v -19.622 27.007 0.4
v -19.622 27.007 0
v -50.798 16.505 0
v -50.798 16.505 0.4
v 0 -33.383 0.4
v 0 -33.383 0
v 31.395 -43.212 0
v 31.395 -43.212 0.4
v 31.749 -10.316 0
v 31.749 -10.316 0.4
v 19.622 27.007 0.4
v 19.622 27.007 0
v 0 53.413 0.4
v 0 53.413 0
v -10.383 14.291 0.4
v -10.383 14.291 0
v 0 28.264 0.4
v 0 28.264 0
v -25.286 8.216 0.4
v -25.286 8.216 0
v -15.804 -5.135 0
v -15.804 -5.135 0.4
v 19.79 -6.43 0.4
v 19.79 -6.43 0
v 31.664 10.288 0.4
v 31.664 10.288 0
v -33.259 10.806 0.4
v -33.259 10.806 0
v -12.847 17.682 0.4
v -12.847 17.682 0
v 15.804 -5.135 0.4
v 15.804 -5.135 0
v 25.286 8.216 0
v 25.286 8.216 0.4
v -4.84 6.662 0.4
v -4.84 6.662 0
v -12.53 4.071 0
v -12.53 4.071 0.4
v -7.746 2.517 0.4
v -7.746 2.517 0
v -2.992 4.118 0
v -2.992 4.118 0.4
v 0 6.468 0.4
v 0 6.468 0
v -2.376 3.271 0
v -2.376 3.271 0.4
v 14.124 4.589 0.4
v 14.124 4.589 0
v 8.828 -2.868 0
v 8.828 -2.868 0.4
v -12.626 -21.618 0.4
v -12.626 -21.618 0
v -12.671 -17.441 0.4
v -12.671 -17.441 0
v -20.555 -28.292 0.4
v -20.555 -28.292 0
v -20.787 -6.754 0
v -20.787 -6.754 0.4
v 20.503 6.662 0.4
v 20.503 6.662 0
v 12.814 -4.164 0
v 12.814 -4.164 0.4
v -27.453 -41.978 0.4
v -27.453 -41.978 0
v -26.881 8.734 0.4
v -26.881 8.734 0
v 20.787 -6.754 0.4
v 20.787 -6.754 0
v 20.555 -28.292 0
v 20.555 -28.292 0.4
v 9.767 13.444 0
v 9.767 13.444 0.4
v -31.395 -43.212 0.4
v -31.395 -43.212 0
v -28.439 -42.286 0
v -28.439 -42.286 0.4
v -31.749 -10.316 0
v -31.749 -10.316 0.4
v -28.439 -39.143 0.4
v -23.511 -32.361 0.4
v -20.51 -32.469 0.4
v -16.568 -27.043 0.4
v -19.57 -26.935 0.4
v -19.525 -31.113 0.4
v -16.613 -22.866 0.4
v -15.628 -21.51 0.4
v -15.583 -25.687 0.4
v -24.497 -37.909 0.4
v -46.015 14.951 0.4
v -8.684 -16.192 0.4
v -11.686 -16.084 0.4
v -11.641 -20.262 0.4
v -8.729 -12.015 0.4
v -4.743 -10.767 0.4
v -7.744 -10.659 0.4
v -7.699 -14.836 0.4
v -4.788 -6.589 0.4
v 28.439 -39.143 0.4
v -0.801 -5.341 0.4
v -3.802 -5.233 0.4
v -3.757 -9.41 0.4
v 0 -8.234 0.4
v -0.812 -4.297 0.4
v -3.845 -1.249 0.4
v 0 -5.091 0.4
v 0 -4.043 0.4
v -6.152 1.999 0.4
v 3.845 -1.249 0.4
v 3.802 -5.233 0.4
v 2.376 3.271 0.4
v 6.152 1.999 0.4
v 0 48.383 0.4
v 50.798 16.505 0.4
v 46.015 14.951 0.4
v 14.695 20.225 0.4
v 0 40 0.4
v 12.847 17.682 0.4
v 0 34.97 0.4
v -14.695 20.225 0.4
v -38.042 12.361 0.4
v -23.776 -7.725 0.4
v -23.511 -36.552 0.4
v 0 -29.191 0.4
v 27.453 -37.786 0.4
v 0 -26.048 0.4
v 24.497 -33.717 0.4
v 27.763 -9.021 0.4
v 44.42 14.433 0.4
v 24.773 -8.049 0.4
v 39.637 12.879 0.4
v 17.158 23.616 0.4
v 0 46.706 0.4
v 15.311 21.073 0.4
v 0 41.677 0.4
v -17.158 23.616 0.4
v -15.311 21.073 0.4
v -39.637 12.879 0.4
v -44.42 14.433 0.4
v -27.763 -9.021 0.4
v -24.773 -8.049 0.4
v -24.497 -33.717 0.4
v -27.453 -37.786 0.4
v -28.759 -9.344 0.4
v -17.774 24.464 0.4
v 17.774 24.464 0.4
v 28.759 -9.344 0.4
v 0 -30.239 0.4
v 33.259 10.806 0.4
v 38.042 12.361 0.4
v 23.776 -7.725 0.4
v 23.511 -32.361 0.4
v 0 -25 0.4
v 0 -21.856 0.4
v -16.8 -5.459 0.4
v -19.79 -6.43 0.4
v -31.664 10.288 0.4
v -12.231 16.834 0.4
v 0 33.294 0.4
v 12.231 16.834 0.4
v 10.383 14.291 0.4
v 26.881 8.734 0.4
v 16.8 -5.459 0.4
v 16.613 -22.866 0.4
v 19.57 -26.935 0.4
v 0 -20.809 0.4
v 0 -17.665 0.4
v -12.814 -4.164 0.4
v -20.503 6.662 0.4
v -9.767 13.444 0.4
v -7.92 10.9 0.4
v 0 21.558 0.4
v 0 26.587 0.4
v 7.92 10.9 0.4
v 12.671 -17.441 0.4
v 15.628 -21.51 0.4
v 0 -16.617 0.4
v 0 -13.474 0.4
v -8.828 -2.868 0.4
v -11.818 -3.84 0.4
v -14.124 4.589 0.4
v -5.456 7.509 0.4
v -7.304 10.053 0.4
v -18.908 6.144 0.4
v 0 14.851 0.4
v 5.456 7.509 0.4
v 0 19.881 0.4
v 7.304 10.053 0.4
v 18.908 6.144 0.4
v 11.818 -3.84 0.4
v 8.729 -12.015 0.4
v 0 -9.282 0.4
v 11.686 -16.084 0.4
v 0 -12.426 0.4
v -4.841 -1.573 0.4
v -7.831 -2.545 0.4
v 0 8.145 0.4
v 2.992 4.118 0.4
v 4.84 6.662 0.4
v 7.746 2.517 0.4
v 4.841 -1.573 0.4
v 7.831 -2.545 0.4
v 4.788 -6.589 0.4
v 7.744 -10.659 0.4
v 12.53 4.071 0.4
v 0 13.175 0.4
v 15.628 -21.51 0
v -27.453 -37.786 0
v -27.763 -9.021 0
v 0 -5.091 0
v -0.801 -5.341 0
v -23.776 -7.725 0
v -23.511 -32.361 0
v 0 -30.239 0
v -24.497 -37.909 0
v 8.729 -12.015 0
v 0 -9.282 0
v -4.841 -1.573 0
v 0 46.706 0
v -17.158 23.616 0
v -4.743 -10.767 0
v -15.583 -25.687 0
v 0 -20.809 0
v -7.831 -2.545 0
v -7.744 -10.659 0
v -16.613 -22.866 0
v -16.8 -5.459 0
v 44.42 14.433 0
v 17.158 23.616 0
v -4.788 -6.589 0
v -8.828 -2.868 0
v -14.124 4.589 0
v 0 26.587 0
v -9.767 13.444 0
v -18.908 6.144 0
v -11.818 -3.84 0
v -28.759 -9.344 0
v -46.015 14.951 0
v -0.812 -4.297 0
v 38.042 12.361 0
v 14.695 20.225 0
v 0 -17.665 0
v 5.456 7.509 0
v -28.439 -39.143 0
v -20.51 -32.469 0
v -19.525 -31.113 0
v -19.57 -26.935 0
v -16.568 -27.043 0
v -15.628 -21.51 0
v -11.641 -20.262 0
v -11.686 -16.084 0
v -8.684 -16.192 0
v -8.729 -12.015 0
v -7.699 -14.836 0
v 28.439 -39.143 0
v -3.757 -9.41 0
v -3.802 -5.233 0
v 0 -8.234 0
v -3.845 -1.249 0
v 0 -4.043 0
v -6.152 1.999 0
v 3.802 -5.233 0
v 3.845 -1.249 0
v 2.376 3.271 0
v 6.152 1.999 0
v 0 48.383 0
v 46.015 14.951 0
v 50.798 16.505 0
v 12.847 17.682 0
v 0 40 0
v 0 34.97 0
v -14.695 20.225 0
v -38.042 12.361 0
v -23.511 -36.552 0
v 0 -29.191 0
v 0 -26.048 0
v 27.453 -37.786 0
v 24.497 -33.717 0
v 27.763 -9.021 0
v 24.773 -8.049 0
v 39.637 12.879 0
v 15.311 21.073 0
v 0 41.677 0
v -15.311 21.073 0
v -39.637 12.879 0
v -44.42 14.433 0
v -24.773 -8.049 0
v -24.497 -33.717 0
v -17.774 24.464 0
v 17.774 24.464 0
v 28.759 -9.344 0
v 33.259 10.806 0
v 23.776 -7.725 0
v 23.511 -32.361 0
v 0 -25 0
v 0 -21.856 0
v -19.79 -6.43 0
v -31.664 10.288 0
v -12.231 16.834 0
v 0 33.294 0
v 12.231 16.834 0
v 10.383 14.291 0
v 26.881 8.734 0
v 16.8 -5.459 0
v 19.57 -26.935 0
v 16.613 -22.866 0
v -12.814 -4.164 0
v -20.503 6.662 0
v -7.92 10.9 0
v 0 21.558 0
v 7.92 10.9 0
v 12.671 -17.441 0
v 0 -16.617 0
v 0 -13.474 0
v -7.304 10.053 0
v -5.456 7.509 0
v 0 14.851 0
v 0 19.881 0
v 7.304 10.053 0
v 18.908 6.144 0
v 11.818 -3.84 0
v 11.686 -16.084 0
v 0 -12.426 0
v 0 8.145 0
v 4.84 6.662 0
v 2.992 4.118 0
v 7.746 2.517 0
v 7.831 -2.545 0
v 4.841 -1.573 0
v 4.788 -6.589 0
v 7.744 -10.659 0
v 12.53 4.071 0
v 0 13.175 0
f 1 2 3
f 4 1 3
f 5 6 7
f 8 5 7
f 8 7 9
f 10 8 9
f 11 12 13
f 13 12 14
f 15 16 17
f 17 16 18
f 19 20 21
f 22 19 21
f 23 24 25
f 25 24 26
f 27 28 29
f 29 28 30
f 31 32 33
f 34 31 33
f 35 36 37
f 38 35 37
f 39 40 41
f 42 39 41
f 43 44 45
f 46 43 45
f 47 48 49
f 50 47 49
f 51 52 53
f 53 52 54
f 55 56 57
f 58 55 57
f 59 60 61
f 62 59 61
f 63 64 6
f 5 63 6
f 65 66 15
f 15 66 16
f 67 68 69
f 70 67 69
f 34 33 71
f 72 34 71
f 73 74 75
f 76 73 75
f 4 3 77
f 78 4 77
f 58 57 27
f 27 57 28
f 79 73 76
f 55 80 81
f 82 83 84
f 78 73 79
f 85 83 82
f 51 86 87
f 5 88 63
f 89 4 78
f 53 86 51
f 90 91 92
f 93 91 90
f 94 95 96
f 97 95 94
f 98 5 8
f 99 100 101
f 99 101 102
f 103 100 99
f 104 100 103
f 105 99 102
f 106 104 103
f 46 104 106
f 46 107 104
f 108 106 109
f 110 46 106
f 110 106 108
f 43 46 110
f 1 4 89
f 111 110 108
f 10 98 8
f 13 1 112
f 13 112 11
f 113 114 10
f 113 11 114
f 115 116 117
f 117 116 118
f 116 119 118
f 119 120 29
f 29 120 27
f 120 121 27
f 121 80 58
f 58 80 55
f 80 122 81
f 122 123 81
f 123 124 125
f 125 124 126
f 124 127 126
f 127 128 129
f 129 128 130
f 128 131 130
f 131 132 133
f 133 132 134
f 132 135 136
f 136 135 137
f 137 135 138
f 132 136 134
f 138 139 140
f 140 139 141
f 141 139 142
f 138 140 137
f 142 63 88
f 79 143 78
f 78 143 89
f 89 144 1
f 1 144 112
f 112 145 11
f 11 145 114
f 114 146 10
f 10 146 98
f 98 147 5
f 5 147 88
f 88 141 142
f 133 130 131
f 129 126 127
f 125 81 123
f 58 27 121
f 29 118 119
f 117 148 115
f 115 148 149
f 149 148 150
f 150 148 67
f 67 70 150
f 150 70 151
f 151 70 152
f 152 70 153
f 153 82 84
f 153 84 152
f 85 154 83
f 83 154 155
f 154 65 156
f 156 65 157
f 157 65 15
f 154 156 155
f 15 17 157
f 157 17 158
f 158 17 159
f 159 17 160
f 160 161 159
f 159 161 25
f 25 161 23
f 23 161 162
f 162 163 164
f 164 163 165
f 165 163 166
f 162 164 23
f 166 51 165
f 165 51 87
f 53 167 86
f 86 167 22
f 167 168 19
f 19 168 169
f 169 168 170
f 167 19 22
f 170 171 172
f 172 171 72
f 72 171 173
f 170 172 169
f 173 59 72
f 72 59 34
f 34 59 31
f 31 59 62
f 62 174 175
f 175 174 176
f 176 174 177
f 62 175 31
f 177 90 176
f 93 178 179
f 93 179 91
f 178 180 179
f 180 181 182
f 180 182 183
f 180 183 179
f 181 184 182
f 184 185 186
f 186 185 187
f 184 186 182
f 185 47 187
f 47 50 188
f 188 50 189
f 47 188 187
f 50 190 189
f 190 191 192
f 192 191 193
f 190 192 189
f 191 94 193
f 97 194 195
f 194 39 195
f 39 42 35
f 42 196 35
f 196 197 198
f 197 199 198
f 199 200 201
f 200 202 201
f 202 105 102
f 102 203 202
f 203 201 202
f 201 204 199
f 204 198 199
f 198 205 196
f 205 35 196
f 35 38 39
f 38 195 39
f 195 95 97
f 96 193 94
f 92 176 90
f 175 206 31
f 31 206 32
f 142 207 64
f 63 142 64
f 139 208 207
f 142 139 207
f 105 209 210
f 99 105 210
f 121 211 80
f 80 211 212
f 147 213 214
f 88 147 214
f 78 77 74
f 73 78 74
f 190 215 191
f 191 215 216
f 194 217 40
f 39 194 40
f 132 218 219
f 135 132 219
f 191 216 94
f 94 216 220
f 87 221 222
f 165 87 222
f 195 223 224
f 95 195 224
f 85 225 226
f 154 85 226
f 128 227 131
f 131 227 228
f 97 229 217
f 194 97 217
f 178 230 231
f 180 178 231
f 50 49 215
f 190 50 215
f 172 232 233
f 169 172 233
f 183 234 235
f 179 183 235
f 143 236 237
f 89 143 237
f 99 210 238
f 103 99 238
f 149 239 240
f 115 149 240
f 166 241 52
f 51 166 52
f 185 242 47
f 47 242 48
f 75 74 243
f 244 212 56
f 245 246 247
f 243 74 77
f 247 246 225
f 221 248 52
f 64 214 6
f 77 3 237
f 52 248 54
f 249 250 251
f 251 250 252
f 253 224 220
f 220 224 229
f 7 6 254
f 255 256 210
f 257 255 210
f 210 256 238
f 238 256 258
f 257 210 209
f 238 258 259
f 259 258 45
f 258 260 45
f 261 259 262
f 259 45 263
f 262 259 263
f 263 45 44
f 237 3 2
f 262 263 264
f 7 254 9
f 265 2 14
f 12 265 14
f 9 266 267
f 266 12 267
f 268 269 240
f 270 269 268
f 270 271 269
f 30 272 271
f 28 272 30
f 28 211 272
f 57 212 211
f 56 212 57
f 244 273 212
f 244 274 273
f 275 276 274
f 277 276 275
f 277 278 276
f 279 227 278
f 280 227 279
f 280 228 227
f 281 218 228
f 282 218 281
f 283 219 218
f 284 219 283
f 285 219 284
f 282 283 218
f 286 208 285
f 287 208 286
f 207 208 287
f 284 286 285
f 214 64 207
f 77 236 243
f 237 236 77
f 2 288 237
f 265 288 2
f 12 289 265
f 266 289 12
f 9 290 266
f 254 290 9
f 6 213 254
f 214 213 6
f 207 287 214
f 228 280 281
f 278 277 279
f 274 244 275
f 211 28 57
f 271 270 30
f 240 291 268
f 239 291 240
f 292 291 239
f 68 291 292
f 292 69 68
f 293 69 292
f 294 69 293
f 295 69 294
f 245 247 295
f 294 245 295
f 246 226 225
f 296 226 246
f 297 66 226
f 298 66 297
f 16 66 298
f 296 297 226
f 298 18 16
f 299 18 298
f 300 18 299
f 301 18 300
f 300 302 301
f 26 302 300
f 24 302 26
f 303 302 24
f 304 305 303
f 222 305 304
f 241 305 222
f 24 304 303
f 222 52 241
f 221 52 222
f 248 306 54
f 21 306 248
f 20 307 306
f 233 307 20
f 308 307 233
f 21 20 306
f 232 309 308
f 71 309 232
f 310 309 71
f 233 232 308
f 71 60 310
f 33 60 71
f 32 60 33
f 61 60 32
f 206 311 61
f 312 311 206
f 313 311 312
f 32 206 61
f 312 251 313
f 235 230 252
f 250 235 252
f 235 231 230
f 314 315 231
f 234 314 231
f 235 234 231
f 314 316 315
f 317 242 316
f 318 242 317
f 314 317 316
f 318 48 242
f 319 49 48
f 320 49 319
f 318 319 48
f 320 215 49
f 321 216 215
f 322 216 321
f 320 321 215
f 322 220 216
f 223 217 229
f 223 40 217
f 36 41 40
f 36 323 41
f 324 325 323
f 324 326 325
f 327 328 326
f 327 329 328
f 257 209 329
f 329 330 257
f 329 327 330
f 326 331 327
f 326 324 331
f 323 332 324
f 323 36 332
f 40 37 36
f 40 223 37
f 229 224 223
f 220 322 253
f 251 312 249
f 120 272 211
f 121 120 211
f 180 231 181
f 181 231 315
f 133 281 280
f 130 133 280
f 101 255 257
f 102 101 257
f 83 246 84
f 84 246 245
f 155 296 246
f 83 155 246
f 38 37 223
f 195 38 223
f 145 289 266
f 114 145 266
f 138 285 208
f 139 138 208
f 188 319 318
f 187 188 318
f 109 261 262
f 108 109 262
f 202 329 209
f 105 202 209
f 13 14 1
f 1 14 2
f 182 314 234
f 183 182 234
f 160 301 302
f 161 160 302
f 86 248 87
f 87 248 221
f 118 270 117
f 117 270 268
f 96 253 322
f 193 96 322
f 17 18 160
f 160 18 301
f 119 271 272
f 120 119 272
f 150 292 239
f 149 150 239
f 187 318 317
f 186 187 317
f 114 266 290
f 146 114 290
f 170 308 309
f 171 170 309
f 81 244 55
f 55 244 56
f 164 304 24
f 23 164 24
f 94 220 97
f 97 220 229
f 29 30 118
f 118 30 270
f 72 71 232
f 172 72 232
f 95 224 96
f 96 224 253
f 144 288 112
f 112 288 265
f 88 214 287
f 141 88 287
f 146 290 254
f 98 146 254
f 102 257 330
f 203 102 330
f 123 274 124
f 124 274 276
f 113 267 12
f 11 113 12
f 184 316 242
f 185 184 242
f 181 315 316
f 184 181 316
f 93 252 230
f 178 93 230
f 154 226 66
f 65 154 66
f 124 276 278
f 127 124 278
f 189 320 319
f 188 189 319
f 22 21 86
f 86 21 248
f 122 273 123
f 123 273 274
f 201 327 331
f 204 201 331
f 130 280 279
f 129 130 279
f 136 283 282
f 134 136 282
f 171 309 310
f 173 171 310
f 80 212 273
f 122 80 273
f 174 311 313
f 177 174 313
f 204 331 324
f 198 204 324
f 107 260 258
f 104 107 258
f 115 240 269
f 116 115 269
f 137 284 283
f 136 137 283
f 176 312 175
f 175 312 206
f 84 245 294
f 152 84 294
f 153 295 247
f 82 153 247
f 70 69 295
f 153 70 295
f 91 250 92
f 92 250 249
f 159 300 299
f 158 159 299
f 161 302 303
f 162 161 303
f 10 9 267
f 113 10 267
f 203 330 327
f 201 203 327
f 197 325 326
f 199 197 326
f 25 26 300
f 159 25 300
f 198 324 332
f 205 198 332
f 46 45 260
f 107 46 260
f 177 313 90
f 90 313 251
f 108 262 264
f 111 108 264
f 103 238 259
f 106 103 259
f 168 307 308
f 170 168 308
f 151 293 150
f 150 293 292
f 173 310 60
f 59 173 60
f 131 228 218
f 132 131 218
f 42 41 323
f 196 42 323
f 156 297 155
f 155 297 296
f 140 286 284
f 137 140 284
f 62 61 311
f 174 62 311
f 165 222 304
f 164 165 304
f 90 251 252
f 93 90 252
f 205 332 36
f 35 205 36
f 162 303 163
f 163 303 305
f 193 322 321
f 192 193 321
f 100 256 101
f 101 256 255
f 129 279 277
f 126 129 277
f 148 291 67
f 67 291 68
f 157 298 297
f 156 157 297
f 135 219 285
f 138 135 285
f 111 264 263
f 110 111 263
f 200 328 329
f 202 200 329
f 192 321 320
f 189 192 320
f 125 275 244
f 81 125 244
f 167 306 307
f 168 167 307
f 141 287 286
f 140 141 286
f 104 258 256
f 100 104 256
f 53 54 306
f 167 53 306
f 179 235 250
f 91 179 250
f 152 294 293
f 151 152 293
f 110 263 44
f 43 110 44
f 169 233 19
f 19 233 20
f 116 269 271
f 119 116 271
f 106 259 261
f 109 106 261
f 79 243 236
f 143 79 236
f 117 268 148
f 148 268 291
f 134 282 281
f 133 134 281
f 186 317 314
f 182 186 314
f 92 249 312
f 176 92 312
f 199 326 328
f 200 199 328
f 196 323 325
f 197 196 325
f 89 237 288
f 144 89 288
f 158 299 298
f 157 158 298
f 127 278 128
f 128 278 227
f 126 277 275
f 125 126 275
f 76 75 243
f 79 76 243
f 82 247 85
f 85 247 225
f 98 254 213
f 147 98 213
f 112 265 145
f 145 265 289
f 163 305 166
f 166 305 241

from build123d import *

# Parameters (mm, degrees)
F1_DEPTH = 0.4


with BuildPart() as f1:
    # F0 (on Top) → F1 (new body)
    with BuildSketch(Plane.XY):
        Polygon((14.694631, 20.225425), (0, 40), (-14.694631, 20.225425), (-38.042261, 12.36068), (-23.776413, -7.725425), (-23.51141, -32.36068), (-23.51141, -36.552122), (0, -29.191442), (27.453279, -37.786197), (27.762712, -9.020652), (44.420338, 14.433043), (17.158299, 23.616373), (0, 46.706308), (-17.158299, 23.616373), (-44.420338, 14.433043), (-27.762712, -9.020652), (-27.453279, -37.786197), (-27.453279, -41.977639), (0, -33.382885), (31.395148, -43.211714), (31.74901, -10.315879), (50.798416, 16.505406), (19.621967, 27.007321), (0, 53.412616), (-19.621967, 27.007321), (-50.798416, 16.505406), (-31.74901, -10.315879), (-31.395148, -43.211714), (-28.438746, -42.286158), (-28.438746, -39.142576), (-28.759286, -9.344459), (-46.014858, 14.951134), (-17.774216, 24.46411), (0, 48.382885), (17.774216, 24.46411), (46.014858, 14.951134), (28.759286, -9.344459), (28.438746, -39.142576), (0, -30.239303), (-24.496877, -37.908501), (-24.496877, -33.717059), (-24.772988, -8.049232), (-39.63678, 12.878771), (-15.310548, 21.073162), (0, 41.676577), (15.310548, 21.073162), (39.63678, 12.878771), (24.772988, -8.049232), (24.496877, -33.717059), (0, -26.047861), (-20.510072, -32.468916), (-20.555008, -28.291542), (-20.786689, -6.754005), (-33.258702, 10.806407), (-12.84688, 17.682214), (0, 34.970269), (12.84688, 17.682214), (33.258702, 10.806407), (20.786689, -6.754005), (20.555008, -28.291542), (0, -21.856418), (-16.568203, -27.043399), (-16.61314, -22.866025), (-16.80039, -5.458778), (-26.880625, 8.734044), (-10.383212, 14.291266), (0, 28.263961), (10.383212, 14.291266), (26.880625, 8.734044), (16.80039, -5.458778), (16.61314, -22.866025), (0, -17.664976), (-12.626335, -21.617882), (-12.671271, -17.440508), (-12.814092, -4.163551), (-20.502547, 6.661681), (-7.919544, 10.900318), (0, 21.557654), (7.919544, 10.900318), (20.502547, 6.661681), (12.814092, -4.163551), (12.671271, -17.440508), (0, -13.473533), (-8.684466, -16.192365), (-8.729402, -12.014991), (-8.827793, -2.868324), (-14.124469, 4.589318), (-5.455876, 7.509369), (0, 14.851346), (5.455876, 7.509369), (14.124469, 4.589318), (8.827793, -2.868324), (8.729402, -12.014991), (0, -9.282091), (-4.742597, -10.766848), (-4.787533, -6.589474), (-4.841495, -1.573097), (-7.746391, 2.516955), (-2.992208, 4.118421), (0, 8.145038), (2.992208, 4.118421), (7.746391, 2.516955), (4.841495, -1.573097), (4.787533, -6.589474), (0, -5.090649), (-0.800728, -5.341331), (-0.811962, -4.296988), (0, -4.042788), (3.802066, -5.233095), (3.84492, -1.24929), (6.151872, 1.998864), (2.376291, 3.270684), (0, 6.468461), (-2.376291, 3.270684), (-6.151872, 1.998864), (-3.84492, -1.24929), (-3.802066, -5.233095), (-3.75713, -9.410469), (0, -8.23423), (7.743935, -10.658612), (7.831219, -2.544517), (12.52995, 4.071227), (4.839959, 6.661632), (0, 13.174769), (-4.839959, 6.661632), (-12.52995, 4.071227), (-7.831219, -2.544517), (-7.743935, -10.658612), (-7.698999, -14.835986), (0, -12.425673), (11.685804, -16.084129), (11.817517, -3.839744), (18.908027, 6.143591), (7.303627, 10.05258), (0, 19.881077), (-7.303627, 10.05258), (-18.908027, 6.143591), (-11.817517, -3.839744), (-11.685804, -16.084129), (-11.640867, -20.261503), (0, -16.617115), (15.627672, -21.509646), (15.803816, -5.134971), (25.286105, 8.215954), (9.767295, 13.443529), (0, 26.587384), (-9.767295, 13.443529), (-25.286105, 8.215954), (-15.803816, -5.134971), (-15.627672, -21.509646), (-15.582736, -25.68702), (0, -20.808558), (19.569541, -26.935163), (19.790114, -6.430198), (31.664183, 10.288317), (12.230963, 16.834477), (0, 33.293692), (-12.230963, 16.834477), (-31.664183, 10.288317), (-19.790114, -6.430198), (-19.569541, -26.935163), (-19.524605, -31.112537), (0, -25), (23.51141, -32.36068), (23.776413, -7.725425), (38.042261, 12.36068), align=None)
    extrude(amount=F1_DEPTH)


solid = f1.part
